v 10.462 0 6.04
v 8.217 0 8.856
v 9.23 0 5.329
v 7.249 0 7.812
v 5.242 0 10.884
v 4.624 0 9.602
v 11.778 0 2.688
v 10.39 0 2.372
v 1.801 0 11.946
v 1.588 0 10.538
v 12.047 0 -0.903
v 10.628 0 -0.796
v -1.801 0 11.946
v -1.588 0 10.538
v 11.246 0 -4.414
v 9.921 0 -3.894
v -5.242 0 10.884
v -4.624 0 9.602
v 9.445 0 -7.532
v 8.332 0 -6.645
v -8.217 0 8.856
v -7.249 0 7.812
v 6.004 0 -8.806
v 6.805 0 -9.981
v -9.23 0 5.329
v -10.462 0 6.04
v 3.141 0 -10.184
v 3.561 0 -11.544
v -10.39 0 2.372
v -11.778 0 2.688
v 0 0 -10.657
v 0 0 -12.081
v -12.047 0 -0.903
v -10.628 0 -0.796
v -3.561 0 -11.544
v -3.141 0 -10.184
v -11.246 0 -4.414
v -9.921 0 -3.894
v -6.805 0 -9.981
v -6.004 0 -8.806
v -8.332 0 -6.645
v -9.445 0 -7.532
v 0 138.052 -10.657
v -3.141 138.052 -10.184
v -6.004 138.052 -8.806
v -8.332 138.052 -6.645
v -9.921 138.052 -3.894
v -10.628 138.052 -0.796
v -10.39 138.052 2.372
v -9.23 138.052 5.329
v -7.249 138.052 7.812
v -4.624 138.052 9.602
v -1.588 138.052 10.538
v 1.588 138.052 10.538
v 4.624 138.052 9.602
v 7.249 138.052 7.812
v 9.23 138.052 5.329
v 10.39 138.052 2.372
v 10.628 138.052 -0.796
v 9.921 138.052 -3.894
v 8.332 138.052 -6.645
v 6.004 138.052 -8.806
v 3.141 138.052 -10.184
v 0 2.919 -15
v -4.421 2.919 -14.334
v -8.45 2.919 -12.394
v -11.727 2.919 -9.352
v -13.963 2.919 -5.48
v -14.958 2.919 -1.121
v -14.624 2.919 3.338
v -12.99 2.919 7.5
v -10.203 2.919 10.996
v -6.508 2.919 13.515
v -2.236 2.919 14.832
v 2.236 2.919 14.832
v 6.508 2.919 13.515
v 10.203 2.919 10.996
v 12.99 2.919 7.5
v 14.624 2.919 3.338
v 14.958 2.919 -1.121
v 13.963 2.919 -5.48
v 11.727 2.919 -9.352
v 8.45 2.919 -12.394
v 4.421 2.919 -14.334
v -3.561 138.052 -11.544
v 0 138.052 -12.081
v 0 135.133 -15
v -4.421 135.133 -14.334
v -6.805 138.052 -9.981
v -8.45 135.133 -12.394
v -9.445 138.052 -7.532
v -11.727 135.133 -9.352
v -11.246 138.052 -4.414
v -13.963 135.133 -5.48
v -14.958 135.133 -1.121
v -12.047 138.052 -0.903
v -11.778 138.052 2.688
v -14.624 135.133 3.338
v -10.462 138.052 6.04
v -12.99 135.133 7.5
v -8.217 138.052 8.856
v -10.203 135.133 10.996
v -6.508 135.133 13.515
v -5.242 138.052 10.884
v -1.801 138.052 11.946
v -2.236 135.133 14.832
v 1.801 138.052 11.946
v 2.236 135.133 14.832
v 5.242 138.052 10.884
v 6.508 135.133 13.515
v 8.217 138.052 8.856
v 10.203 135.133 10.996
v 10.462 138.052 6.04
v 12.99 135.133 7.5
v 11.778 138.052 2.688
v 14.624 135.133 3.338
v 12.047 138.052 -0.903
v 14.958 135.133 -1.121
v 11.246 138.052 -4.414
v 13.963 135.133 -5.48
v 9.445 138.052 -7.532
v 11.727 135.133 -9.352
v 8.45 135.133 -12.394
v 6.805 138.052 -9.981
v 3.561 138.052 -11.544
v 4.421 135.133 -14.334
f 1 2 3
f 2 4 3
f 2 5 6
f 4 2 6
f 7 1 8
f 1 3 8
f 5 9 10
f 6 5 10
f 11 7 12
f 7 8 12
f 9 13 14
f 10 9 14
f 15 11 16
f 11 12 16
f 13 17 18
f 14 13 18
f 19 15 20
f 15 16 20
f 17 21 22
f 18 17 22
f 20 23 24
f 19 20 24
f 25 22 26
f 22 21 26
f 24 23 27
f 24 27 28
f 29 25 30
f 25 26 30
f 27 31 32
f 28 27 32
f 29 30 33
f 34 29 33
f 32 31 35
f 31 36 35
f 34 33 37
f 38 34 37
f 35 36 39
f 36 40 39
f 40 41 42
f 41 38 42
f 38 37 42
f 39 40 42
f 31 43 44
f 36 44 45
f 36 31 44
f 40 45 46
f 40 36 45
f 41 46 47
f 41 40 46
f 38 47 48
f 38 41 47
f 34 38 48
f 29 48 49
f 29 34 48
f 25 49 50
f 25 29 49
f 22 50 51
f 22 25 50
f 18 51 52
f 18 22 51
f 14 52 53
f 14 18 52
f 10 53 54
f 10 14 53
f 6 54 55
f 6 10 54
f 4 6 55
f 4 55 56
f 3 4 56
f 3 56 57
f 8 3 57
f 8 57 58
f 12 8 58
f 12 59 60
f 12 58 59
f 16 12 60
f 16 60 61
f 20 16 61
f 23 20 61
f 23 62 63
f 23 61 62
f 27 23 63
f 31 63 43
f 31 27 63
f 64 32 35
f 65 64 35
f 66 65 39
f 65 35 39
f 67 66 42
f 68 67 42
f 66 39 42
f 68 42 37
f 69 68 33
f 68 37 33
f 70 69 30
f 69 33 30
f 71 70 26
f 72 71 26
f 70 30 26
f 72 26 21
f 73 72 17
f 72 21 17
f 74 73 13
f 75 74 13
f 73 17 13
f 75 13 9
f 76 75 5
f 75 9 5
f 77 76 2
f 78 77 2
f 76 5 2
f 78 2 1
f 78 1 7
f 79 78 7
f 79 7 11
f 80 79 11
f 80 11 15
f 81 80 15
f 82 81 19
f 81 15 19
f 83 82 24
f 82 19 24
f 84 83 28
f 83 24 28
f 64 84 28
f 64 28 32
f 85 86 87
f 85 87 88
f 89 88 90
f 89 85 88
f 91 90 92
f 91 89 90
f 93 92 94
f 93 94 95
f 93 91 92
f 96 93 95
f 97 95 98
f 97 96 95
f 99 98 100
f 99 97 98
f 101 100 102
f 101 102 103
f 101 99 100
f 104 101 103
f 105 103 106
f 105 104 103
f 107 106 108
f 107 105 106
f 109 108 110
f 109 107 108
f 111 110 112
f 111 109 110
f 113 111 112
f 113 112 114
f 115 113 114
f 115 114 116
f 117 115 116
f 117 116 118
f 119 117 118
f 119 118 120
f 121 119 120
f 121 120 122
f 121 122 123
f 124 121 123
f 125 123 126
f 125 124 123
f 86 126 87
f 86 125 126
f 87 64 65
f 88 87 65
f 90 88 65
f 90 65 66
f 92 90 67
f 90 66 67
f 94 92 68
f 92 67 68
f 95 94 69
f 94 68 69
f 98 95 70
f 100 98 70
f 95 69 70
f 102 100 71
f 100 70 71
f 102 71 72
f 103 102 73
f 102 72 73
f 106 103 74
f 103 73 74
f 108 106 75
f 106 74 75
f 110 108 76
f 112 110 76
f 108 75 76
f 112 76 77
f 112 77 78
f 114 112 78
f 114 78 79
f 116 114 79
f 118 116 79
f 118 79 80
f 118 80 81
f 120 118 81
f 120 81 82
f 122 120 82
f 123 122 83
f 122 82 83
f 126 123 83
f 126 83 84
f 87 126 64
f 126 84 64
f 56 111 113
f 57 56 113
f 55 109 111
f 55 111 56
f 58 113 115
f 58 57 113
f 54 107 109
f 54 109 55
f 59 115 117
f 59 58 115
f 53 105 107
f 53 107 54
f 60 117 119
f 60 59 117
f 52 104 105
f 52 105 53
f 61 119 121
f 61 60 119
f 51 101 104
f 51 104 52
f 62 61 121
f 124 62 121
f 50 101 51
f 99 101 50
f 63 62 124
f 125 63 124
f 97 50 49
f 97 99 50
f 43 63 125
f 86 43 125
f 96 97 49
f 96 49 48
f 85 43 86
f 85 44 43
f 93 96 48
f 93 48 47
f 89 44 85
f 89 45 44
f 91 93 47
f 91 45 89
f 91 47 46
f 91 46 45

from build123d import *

# Parameters (mm, degrees)
SKETCH1_R           = 15
BOSS_EXTRUDE1_DEPTH = 138.051908772
SKETCH2_R           = 10.65749531
CUT_EXTRUDE1_DEPTH  = 140.672221703
CHAMFER1_SIZE       = 2.919359512


with BuildPart() as part:
    # Sketch1 → Boss-Extrude1 (new body)
    with BuildSketch(Plane(origin=(0, 0, 0), x_dir=(1, 0, 0), z_dir=(0, 1, 0))):
        Circle(SKETCH1_R)
    extrude(amount=BOSS_EXTRUDE1_DEPTH)

    # Sketch2 → Cut-Extrude1 (cut, through all)
    with BuildSketch(Plane(origin=(0, 0, 0), x_dir=(1, 0, 0), z_dir=(0, 1, 0))):
        Circle(SKETCH2_R)
    extrude(amount=CUT_EXTRUDE1_DEPTH, mode=Mode.SUBTRACT)

    # Chamfer1
    chamfer1_edges = [part.edges().sort_by_distance(p)[0] for p in [
        (-15, 138.051908772, 0),
        (-15, 0, 0),
    ]]
    chamfer(chamfer1_edges, length=CHAMFER1_SIZE)


solid = part.part
